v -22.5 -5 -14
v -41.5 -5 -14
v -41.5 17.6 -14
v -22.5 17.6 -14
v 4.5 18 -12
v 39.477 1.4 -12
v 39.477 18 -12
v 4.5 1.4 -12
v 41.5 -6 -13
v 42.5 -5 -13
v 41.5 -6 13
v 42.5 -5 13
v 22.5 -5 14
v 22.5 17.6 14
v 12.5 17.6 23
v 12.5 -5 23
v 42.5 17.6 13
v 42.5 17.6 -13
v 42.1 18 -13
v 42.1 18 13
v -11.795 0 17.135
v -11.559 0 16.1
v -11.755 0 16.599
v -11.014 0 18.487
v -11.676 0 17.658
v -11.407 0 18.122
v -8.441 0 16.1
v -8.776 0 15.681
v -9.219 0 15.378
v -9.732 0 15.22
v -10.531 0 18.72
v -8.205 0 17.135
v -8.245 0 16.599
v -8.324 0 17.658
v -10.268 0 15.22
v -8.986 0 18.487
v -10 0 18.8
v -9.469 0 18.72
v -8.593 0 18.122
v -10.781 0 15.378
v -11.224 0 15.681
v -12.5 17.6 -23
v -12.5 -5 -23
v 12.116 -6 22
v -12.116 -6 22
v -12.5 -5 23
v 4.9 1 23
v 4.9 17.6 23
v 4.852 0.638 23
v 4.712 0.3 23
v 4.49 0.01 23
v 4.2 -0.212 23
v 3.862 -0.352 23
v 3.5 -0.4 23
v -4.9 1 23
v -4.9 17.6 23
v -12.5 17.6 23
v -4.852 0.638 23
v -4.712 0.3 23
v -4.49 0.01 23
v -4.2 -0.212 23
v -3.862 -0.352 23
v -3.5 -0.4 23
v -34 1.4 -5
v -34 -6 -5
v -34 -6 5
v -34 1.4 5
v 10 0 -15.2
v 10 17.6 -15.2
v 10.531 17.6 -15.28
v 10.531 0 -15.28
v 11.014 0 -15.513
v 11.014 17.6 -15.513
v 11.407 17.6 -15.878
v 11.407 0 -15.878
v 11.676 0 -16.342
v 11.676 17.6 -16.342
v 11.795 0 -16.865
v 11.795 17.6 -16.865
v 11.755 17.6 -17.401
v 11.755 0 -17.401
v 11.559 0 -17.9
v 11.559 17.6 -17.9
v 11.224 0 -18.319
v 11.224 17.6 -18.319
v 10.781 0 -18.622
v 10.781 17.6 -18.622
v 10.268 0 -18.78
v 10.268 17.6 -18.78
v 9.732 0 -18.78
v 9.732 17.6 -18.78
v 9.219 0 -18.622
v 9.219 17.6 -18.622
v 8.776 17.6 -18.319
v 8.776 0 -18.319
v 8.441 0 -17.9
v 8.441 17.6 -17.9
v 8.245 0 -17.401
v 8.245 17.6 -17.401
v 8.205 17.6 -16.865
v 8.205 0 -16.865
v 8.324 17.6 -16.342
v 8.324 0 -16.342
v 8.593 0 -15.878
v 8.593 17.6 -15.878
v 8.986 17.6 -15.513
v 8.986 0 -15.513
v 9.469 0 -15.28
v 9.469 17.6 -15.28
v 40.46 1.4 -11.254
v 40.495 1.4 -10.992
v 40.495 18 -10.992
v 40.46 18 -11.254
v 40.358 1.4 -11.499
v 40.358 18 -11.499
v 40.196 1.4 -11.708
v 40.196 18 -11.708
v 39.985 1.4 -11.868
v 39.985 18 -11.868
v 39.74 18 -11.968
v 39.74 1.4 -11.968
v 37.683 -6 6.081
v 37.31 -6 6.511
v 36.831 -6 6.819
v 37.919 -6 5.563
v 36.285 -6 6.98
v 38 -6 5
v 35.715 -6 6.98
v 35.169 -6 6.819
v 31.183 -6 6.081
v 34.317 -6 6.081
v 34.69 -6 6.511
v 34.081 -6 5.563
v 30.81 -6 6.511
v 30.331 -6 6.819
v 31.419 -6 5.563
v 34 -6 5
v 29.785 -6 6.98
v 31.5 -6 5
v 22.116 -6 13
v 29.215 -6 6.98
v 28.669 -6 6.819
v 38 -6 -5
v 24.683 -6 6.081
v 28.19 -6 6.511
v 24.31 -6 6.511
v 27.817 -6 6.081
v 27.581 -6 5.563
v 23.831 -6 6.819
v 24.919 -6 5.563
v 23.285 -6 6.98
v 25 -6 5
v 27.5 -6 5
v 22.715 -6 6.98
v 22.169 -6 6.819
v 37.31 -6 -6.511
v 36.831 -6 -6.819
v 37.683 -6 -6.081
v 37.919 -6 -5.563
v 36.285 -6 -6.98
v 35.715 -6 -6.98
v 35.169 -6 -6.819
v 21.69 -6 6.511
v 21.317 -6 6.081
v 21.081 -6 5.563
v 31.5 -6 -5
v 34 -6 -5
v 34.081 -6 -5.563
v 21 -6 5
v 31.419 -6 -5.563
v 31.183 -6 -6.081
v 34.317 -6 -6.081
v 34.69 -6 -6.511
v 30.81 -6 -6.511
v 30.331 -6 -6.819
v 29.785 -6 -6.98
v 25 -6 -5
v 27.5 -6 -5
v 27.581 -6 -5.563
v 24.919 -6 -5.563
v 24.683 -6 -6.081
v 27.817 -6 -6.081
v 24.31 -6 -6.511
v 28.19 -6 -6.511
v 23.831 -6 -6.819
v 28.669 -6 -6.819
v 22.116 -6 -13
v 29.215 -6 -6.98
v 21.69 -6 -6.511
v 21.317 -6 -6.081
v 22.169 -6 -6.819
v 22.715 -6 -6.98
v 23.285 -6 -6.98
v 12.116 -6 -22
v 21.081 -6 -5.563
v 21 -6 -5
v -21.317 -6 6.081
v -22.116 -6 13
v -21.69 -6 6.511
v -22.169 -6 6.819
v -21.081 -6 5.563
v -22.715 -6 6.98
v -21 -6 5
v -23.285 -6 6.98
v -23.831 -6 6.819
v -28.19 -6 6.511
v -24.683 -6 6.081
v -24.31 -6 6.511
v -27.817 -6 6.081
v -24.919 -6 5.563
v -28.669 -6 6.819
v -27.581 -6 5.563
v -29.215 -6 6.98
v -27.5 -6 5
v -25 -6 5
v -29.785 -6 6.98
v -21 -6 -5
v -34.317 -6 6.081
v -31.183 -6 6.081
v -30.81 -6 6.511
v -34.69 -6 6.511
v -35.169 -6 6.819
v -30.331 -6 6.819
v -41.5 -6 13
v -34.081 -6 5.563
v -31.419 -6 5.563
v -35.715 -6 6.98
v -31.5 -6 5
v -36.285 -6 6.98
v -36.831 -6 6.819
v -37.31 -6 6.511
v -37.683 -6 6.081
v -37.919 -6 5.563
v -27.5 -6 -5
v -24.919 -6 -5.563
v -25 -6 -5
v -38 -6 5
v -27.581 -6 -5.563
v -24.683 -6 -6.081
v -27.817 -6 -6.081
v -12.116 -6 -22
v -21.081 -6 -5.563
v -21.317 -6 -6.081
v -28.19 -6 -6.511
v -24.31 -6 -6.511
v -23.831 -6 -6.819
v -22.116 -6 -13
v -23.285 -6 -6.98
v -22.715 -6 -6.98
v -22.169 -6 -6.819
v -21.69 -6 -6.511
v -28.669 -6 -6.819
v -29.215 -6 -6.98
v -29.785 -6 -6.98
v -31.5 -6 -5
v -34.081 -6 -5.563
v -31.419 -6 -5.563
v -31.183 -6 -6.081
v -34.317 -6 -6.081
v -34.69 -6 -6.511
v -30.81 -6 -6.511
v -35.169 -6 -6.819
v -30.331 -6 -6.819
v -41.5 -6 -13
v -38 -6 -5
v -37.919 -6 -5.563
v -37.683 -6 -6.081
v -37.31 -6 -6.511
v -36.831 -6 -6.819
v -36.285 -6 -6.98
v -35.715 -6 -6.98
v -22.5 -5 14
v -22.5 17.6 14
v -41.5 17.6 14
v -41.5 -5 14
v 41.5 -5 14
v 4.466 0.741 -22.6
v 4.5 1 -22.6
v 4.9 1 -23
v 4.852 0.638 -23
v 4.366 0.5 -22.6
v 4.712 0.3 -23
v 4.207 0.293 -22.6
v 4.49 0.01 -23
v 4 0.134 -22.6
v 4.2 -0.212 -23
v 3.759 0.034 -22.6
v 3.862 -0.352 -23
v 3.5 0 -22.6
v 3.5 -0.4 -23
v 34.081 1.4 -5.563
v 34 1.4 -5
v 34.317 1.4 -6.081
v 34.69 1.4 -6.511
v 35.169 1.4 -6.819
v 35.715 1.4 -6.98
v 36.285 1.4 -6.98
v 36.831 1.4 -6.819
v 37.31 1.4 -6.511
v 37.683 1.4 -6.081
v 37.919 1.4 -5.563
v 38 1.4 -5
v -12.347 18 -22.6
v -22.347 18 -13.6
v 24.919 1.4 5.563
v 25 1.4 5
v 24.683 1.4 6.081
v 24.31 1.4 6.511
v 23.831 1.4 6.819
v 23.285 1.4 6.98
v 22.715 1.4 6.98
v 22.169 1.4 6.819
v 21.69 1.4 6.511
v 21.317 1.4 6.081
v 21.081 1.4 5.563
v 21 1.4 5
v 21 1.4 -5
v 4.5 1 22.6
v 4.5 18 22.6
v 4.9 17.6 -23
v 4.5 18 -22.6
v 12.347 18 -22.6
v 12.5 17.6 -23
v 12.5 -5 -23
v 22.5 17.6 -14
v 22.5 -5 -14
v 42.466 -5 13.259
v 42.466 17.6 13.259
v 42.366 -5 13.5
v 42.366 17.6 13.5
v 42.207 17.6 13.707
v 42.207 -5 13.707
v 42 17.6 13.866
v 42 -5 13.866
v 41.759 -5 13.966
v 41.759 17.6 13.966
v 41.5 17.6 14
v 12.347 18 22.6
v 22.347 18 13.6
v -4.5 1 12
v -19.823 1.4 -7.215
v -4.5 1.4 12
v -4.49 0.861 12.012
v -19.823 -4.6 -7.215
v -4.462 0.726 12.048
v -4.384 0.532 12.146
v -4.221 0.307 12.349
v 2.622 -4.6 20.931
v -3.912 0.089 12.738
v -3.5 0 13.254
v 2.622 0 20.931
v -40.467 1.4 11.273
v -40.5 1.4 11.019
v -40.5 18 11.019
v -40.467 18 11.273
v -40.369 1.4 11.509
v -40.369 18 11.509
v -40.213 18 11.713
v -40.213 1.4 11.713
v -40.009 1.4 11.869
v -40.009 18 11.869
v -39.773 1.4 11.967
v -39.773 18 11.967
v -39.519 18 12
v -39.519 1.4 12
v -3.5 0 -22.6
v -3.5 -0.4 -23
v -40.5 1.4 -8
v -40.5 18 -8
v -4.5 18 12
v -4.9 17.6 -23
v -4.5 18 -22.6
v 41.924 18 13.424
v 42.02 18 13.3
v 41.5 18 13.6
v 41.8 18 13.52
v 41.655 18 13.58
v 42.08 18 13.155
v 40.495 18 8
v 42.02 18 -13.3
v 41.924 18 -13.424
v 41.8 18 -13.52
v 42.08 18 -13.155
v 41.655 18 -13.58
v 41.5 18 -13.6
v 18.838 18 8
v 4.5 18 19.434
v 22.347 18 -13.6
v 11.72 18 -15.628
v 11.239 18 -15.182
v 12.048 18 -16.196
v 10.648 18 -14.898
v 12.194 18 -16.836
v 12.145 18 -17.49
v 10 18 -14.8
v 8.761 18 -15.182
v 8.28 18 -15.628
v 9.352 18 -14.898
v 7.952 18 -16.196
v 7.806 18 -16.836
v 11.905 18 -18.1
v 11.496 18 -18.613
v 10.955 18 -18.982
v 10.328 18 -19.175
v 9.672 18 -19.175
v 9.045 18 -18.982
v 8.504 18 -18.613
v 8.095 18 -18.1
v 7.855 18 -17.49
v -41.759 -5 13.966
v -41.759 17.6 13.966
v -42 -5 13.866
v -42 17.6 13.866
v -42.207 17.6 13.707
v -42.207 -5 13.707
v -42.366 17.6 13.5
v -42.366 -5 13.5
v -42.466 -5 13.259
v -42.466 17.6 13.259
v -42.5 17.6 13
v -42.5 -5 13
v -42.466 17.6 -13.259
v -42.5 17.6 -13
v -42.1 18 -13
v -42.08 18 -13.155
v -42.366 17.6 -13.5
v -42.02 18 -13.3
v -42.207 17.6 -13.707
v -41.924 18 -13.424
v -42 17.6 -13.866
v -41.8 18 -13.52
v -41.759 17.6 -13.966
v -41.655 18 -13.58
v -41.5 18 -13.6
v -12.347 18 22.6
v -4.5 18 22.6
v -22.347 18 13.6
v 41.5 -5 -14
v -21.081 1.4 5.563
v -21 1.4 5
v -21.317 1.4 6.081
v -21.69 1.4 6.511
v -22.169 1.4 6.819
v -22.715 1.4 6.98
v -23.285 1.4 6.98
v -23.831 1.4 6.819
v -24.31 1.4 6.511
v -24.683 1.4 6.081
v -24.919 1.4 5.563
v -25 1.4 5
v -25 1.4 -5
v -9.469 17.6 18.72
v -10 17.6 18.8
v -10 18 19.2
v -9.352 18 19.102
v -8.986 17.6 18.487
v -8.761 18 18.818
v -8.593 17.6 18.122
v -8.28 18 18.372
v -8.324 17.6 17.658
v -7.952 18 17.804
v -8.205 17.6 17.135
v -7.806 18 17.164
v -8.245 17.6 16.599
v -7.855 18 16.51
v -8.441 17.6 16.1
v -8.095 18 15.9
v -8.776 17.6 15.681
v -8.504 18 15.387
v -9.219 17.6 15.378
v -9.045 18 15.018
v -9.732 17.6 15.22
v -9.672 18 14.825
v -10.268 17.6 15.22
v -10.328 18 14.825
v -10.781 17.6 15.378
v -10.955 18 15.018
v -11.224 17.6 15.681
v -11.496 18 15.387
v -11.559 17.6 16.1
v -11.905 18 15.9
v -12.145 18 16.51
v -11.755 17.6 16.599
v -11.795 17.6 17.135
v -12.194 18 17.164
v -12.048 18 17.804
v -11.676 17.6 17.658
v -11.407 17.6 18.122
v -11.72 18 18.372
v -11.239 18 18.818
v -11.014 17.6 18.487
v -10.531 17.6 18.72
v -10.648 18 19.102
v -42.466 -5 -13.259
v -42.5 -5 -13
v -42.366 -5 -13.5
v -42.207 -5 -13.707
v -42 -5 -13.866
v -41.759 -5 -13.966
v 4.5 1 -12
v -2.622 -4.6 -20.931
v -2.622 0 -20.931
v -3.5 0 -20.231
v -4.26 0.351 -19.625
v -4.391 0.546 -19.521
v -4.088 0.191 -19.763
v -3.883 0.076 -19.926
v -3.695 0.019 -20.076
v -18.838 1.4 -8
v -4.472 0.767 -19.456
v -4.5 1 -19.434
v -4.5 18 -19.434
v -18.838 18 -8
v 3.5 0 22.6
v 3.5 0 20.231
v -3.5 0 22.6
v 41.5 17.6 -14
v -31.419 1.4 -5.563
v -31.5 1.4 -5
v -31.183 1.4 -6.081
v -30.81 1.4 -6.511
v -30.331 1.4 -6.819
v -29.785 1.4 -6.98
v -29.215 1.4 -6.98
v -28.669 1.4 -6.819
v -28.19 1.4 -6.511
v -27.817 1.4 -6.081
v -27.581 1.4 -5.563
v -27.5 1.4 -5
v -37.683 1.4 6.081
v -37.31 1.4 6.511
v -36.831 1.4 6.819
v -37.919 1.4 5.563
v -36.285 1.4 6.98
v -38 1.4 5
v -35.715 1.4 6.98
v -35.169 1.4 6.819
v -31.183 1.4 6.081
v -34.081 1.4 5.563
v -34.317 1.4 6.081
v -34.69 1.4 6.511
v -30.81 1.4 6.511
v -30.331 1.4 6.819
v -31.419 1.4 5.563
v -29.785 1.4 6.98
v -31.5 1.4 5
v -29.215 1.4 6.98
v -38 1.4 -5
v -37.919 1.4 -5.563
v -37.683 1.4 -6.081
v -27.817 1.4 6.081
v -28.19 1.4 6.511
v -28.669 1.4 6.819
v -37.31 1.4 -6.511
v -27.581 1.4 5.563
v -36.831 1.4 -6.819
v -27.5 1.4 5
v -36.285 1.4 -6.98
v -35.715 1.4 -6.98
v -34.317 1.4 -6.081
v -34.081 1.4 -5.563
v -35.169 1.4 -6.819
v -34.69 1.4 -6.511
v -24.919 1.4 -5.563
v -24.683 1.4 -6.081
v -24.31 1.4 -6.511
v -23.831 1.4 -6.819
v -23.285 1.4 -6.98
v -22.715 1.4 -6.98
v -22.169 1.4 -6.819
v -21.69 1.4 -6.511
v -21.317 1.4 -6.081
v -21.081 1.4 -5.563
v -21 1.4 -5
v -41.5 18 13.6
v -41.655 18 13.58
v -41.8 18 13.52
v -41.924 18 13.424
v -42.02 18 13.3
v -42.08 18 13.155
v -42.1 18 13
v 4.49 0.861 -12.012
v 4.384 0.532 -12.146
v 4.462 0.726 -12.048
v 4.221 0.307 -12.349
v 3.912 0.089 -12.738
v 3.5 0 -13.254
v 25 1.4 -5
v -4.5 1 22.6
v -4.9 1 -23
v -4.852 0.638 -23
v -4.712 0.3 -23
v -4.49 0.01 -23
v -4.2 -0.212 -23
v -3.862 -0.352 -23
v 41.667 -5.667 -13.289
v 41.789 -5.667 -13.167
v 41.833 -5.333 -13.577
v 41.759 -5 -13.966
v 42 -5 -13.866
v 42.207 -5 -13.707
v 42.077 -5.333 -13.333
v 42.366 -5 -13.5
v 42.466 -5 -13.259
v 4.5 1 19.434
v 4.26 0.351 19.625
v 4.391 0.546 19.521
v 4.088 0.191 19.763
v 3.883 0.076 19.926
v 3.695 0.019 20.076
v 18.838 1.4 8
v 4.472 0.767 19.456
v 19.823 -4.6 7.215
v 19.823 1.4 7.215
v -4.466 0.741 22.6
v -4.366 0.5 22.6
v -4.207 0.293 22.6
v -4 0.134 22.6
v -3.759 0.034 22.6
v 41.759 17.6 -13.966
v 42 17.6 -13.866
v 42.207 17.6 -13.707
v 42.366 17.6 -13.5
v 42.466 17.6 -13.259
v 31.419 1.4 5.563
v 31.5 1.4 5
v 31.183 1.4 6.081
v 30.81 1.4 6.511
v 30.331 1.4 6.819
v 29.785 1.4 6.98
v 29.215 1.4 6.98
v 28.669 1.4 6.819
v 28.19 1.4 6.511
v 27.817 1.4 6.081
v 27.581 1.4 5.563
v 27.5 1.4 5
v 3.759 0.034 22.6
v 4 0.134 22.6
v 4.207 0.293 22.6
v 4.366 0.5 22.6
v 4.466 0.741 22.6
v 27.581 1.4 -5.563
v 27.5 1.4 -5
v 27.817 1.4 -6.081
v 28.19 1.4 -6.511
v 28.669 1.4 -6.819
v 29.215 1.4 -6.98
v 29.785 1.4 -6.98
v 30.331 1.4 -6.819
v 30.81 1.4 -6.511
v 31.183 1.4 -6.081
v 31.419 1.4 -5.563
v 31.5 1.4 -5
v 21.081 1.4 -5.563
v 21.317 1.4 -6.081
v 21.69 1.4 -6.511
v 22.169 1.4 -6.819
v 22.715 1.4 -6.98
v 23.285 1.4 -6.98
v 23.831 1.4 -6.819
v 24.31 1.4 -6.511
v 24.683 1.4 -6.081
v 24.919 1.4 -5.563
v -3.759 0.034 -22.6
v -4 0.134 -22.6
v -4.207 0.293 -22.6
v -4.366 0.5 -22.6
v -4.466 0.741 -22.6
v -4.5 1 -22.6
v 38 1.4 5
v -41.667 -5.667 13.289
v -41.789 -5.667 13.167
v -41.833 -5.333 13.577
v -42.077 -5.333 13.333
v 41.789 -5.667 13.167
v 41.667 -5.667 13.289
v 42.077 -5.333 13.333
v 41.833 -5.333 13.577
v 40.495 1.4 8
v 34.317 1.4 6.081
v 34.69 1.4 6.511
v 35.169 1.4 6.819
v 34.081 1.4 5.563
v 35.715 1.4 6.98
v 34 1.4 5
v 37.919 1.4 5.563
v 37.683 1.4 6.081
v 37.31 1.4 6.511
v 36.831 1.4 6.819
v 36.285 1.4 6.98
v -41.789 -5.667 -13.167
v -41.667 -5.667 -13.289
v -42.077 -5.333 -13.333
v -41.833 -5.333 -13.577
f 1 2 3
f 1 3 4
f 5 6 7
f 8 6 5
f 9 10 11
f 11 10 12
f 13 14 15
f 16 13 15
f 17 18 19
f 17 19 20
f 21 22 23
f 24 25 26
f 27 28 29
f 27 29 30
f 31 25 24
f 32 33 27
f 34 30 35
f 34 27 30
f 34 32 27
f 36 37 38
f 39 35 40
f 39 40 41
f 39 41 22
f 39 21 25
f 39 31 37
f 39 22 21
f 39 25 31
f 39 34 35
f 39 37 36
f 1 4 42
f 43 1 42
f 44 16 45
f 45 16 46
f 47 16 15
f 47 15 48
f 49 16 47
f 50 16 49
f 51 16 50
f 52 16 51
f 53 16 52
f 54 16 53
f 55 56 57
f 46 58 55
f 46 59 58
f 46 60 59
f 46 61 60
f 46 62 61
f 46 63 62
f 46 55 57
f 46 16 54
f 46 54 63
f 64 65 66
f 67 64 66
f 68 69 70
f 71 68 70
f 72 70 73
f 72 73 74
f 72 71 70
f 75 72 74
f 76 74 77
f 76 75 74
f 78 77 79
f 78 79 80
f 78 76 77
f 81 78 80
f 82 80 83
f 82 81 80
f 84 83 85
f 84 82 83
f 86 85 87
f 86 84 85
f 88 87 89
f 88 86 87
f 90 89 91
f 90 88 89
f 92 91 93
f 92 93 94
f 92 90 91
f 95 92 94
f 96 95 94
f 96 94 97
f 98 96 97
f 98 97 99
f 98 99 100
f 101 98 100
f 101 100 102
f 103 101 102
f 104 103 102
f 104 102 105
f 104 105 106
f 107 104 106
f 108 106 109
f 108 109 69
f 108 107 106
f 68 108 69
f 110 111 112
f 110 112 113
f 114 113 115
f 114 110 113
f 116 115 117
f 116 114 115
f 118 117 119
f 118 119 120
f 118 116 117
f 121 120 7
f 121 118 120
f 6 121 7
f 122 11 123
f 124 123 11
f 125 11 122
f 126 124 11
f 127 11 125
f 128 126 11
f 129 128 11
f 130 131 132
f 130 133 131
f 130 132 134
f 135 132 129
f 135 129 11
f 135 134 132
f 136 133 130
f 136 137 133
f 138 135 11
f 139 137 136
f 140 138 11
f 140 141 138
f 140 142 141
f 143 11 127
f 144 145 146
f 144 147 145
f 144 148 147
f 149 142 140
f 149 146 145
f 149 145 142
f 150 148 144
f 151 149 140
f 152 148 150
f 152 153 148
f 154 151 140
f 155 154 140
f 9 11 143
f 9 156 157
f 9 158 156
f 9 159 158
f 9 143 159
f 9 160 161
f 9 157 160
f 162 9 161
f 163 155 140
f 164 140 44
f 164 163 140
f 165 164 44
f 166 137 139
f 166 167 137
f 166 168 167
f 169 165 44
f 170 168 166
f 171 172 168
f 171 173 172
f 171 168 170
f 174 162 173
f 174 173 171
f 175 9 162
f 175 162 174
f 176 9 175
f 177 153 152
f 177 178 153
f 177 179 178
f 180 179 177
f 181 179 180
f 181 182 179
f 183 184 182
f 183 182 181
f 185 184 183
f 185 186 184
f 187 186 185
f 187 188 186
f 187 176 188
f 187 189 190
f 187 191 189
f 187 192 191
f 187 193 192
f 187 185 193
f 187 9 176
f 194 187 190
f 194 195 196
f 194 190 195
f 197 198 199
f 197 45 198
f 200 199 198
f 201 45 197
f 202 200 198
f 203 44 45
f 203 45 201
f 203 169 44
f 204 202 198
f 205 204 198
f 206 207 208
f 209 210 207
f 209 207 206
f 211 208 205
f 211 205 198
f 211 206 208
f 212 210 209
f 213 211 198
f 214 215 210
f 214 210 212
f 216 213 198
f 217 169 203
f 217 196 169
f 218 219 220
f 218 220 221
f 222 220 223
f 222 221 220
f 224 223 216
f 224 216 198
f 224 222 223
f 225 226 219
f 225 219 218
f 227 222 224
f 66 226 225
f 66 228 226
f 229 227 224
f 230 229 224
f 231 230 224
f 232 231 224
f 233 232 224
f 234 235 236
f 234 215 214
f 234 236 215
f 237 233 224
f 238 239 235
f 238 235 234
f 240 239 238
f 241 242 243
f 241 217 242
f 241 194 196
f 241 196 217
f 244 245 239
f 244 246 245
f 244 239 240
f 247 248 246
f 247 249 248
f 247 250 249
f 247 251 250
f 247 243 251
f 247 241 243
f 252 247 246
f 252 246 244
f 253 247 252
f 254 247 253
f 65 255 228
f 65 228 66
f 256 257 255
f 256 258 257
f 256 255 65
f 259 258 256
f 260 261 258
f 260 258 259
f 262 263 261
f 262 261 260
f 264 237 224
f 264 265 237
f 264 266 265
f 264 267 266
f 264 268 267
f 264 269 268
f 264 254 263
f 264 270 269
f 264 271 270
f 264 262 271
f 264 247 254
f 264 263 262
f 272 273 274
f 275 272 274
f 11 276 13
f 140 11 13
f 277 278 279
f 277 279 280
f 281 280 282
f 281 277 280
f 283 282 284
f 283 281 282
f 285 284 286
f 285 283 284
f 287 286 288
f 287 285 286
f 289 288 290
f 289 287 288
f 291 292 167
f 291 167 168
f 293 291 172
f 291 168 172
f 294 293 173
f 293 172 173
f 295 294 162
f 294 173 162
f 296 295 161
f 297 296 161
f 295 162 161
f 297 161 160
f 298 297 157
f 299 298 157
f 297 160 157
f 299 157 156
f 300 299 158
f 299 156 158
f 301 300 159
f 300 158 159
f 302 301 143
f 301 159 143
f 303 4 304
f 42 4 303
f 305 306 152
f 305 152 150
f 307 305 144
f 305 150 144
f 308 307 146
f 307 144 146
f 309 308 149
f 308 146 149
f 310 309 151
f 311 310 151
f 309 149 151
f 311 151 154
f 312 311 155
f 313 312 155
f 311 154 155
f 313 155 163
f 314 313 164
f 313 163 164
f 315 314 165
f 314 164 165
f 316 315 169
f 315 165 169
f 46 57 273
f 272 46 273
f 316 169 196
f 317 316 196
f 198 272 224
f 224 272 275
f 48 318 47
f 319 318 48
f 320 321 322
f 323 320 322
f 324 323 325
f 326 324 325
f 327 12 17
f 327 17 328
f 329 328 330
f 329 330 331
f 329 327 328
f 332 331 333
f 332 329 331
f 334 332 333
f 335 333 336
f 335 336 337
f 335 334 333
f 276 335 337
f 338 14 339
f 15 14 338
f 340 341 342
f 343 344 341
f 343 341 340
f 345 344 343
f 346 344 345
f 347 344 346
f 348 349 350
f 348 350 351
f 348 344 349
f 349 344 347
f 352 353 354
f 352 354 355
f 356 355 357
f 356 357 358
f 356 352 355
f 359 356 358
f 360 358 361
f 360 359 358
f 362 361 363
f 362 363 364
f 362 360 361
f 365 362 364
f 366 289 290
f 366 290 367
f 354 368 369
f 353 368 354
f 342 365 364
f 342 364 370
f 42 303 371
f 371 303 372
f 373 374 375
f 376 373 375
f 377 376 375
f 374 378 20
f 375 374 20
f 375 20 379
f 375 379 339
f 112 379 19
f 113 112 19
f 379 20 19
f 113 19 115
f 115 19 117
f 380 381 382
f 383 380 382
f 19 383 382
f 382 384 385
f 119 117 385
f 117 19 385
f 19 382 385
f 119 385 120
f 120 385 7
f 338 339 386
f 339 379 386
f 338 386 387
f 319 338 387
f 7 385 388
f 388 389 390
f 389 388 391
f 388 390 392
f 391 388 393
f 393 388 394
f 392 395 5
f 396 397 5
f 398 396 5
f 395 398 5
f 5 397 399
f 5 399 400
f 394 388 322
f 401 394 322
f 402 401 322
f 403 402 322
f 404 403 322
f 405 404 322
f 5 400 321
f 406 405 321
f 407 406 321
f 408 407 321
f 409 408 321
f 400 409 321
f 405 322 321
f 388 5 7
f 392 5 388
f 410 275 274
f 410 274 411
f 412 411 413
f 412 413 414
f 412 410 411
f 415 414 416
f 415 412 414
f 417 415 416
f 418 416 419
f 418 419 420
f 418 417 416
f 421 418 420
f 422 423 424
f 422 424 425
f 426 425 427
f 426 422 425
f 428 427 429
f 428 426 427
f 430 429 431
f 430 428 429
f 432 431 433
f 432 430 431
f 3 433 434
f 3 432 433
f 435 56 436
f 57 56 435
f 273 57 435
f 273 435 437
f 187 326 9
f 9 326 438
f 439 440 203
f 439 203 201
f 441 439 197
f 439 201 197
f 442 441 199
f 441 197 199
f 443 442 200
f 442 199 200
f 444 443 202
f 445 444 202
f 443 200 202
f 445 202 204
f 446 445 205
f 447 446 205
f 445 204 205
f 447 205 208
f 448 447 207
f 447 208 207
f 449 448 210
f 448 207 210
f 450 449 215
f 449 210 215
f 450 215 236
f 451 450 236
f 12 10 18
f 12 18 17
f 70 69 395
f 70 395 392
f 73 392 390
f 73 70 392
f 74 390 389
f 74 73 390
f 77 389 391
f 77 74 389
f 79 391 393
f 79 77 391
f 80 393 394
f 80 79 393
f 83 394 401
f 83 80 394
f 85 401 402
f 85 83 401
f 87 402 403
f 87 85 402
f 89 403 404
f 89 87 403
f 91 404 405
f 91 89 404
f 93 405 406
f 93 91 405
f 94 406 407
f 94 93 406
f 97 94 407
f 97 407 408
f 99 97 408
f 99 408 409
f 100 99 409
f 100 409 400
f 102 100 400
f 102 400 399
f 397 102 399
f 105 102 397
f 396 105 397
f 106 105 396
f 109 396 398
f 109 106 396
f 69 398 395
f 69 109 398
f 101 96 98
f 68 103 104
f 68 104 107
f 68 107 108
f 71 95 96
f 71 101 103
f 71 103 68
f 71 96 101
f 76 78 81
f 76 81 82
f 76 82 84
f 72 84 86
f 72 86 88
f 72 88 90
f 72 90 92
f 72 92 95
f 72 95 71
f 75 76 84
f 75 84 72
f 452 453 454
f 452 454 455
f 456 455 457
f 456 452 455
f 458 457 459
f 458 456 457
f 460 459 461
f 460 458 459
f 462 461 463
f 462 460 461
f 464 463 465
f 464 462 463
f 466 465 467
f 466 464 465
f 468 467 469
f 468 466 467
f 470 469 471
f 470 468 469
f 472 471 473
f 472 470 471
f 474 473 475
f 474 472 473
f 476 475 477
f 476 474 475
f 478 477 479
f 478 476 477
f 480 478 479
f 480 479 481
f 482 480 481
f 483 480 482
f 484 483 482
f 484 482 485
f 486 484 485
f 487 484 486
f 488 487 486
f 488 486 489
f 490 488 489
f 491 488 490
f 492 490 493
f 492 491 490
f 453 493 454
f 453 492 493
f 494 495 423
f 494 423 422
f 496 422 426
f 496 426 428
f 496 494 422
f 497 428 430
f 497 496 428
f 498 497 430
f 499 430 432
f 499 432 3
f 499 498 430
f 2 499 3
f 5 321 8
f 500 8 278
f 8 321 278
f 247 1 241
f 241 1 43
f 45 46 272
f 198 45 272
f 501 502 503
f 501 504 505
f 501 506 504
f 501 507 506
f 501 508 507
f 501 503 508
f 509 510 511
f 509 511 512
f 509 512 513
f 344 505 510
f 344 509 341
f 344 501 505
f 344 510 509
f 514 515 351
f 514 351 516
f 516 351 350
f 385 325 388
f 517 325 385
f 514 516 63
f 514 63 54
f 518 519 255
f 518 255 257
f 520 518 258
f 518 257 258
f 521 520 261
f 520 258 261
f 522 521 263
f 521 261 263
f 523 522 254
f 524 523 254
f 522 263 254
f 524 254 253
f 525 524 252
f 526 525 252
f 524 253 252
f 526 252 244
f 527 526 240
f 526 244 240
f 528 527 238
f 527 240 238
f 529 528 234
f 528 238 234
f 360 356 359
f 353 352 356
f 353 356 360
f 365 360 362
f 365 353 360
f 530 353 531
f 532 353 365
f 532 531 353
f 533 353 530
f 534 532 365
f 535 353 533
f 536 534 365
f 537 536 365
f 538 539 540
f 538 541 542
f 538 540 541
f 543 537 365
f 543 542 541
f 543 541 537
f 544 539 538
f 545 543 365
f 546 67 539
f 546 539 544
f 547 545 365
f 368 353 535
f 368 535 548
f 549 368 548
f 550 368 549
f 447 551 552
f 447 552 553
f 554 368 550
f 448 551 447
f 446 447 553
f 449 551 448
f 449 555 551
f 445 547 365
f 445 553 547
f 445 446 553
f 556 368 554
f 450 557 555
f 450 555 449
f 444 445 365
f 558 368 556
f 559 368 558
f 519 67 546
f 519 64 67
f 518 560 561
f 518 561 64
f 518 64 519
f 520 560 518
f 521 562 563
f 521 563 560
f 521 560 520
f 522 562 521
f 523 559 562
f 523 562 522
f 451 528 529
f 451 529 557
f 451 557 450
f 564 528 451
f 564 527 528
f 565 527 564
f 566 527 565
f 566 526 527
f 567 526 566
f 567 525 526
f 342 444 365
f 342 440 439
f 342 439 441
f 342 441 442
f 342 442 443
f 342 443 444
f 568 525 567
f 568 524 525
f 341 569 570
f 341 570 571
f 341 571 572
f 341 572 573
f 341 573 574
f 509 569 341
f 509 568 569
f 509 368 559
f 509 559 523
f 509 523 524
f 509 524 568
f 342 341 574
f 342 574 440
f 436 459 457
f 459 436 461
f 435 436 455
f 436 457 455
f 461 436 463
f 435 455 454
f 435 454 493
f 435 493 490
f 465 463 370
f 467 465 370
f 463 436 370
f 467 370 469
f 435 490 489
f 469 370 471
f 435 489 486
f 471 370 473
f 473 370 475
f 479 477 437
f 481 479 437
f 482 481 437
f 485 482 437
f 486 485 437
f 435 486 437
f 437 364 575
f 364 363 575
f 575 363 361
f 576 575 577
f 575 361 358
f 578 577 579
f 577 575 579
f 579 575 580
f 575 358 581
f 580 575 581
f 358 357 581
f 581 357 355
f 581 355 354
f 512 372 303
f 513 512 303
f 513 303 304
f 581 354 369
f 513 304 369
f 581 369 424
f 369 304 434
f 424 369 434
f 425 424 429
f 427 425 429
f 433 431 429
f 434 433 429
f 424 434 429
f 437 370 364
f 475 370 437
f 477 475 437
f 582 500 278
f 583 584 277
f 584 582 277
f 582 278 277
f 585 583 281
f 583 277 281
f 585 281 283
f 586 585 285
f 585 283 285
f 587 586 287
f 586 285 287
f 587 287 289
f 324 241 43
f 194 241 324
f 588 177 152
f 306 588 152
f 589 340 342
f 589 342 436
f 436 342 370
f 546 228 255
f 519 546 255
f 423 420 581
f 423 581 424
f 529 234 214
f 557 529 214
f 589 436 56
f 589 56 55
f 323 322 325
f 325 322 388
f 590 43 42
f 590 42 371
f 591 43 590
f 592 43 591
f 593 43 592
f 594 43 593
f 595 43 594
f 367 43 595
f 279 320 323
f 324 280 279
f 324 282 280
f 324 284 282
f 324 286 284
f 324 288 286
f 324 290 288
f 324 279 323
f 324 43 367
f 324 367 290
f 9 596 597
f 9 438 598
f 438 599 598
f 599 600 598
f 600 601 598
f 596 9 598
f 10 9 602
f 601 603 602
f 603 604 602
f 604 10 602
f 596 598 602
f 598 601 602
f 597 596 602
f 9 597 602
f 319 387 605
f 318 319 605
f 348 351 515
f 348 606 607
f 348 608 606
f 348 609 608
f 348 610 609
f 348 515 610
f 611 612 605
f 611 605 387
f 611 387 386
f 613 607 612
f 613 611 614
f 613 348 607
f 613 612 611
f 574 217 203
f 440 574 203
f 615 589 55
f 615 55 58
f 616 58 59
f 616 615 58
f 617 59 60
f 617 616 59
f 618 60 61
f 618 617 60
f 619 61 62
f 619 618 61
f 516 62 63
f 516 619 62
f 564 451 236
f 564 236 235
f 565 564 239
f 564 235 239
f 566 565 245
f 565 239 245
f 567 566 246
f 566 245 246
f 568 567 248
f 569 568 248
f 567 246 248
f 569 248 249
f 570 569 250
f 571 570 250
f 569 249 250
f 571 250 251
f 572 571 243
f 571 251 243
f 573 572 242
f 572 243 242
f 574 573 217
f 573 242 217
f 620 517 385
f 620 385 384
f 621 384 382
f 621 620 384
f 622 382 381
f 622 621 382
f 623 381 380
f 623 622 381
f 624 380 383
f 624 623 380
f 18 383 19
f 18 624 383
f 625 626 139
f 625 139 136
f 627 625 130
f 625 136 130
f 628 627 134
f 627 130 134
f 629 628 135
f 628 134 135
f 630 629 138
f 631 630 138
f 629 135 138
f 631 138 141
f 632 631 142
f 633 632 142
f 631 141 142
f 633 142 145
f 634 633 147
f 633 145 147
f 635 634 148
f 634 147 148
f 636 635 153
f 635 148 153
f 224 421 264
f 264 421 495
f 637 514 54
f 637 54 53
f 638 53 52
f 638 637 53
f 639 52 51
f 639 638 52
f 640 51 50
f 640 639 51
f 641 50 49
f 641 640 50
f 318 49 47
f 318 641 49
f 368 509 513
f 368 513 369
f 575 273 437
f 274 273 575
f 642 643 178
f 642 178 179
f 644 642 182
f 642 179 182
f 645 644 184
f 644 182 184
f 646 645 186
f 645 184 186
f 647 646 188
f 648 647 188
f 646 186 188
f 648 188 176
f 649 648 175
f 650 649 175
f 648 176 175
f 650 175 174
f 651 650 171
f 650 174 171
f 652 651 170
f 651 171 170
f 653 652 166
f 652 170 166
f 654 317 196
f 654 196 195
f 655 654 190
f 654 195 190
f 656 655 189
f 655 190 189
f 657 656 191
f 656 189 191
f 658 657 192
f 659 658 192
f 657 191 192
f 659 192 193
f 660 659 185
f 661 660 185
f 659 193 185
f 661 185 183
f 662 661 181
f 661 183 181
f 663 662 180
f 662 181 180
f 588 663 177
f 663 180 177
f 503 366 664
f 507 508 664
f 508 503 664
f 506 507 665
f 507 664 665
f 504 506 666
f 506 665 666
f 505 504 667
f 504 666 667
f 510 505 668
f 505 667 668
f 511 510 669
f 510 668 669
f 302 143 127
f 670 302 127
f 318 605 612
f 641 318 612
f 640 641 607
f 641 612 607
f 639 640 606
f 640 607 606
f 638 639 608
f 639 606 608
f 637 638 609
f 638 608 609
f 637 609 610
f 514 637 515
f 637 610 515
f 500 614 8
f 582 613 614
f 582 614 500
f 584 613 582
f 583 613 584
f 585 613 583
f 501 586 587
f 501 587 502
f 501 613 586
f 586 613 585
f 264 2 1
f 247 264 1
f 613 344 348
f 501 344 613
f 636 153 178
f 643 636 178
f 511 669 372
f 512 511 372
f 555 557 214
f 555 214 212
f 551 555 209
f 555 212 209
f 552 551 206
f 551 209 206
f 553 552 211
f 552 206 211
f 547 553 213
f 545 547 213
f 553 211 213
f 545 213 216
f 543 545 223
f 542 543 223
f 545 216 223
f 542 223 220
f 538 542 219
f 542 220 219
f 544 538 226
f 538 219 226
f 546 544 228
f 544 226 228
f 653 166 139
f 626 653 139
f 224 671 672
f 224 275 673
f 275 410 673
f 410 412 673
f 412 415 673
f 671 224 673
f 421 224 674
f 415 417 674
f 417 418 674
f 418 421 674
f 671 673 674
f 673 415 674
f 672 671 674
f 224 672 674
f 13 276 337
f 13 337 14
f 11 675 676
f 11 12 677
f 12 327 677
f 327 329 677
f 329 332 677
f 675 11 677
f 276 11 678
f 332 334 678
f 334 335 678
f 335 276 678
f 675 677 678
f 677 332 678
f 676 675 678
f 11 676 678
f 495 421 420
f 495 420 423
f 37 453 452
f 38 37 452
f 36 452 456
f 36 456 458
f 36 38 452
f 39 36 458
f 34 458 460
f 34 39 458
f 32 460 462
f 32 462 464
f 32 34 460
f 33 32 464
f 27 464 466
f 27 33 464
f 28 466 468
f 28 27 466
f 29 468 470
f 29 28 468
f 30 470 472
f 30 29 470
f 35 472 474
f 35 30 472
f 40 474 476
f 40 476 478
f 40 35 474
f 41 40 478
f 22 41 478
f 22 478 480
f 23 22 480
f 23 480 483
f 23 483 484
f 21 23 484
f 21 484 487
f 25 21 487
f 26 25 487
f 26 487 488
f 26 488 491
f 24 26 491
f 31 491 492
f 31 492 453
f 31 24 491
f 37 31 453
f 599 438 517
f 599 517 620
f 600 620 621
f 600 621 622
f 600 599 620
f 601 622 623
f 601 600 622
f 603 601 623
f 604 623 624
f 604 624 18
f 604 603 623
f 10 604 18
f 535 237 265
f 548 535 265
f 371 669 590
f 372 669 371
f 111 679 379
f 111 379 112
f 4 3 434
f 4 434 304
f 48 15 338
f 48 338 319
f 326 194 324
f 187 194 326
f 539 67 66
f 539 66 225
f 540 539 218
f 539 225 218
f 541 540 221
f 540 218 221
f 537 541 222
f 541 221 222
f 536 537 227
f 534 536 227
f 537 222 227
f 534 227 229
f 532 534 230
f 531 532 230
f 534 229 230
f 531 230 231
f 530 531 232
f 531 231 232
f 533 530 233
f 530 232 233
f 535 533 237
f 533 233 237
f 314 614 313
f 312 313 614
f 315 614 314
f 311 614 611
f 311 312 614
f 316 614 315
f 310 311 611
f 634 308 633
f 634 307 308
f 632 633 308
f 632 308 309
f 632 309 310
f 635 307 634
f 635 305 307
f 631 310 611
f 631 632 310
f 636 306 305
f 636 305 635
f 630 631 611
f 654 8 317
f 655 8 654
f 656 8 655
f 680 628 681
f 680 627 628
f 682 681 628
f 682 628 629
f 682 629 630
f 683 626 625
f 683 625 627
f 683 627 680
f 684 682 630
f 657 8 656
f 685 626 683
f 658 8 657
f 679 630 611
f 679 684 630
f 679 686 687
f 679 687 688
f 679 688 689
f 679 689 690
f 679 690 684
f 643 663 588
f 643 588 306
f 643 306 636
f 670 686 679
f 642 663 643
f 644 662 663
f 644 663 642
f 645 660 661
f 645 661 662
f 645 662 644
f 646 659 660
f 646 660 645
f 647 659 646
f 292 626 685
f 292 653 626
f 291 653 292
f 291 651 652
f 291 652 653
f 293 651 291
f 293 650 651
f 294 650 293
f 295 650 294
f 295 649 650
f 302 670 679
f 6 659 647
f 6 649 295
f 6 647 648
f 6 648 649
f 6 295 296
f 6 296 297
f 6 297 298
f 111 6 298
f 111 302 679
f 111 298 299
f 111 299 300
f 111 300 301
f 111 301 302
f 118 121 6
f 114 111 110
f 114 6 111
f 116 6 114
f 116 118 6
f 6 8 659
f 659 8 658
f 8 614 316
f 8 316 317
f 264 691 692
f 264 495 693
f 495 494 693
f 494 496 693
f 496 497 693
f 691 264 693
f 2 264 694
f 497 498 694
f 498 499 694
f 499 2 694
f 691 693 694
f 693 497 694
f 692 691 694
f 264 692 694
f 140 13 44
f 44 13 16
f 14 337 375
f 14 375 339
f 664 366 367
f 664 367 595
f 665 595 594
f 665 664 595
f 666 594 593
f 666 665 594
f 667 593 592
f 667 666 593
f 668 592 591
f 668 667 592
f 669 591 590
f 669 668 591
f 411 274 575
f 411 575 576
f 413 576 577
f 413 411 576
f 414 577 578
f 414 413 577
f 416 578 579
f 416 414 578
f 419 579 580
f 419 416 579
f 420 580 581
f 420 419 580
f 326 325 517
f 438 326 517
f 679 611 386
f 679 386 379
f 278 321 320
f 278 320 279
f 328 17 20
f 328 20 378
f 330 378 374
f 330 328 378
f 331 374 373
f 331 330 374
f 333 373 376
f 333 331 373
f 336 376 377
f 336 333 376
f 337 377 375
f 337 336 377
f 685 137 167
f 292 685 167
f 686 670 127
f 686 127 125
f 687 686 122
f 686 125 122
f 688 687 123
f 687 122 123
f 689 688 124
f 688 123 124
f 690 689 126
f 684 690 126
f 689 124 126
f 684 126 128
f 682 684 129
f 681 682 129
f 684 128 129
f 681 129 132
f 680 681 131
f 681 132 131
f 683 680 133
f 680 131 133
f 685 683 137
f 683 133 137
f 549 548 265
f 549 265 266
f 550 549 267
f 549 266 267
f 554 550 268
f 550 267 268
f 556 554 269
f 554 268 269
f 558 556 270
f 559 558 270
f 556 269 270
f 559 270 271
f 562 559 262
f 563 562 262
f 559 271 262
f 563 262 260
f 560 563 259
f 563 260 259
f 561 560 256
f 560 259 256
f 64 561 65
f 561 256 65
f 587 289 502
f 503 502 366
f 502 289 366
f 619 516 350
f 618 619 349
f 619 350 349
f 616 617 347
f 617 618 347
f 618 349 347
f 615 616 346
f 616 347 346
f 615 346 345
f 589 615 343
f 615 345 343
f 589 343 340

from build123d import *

# Parameters (mm, degrees)
BOSS_EXTRUDE2_DEPTH           = 18
BOSS_EXTRUDE2_DEPTH_BACK      = 6
BOSS_EXTRUDE3_DEPTH           = 18
BOSS_EXTRUDE3_DEPTH_BACK      = 6
LOAD_BAR_ARM_SLOTS_DEPTH      = 30
LOAD_BAR_ARM_SLOTS_DEPTH_BACK = 30
F_10KG_START                  = 1.4
F_10KG_TAL_BAR_SLOT_DEPTH     = 16.6
HX711_CHIP_HOLSTER_DEPTH      = 18
HX711_CHIP_HOLSTER_DEPTH_BACK = 4.6
SKETCH6_R                     = 1.8
SCREW_HOLE_DEPTH              = 18
CHAMFER3_SIZE                 = 0.4
CHAMFER8_SIZE                 = 1
CUT_EXTRUDE6_DEPTH            = 7
CUT_EXTRUDE6_DEPTH_BACK       = 7


with BuildPart() as part:
    # Sketch1 → Boss-Extrude2 (new, two sides: drawn at the far end of the back side and taken through both)
    with BuildSketch(Plane(origin=(0, 0, 0), x_dir=(1, 0, 0), z_dir=(0, 1, 0)).offset(-BOSS_EXTRUDE2_DEPTH_BACK)):
        with BuildLine():
            Line((-41.5, 14), (41.5, 14))
            ThreePointArc((41.5, 14), (42.207106781, 13.707106781), (42.5, 13))
            Line((42.5, 13), (42.5, -13))
            ThreePointArc((42.5, -13), (42.207106781, -13.707106781), (41.5, -14))
            Line((41.5, -14), (-41.5, -14))
            ThreePointArc((-41.5, -14), (-42.207106781, -13.707106781), (-42.5, -13))
            Line((-42.5, -13), (-42.5, 13))
            ThreePointArc((-42.5, 13), (-42.207106781, 13.707106781), (-41.5, 14))
        make_face()
    extrude(amount=BOSS_EXTRUDE2_DEPTH + BOSS_EXTRUDE2_DEPTH_BACK)

    # Sketch4 → Boss-Extrude3 (add, two sides: drawn at the far end of the back side and taken through both)
    with BuildSketch(Plane(origin=(0, 0, 0), x_dir=(1, 0, 0), z_dir=(0, 1, 0)).offset(-BOSS_EXTRUDE3_DEPTH_BACK)):
        Polygon((-12.5, 23), (12.5, 23), (22.5, 14), (22.5, -14), (12.5, -23), (-12.5, -23), (-22.5, -14), (-22.5, 14), align=None)
    extrude(amount=BOSS_EXTRUDE3_DEPTH + BOSS_EXTRUDE3_DEPTH_BACK)

    # Sketch2 → load bar arm slots (cut, two sides: drawn at the far end of the back side and taken through both)
    with BuildSketch(Plane.XY.offset(-LOAD_BAR_ARM_SLOTS_DEPTH_BACK)):
        with BuildLine():
            Line((-3.5, 19), (3.5, 19))
            ThreePointArc((3.5, 19), (4.207106781, 18.707106781), (4.5, 18))
            Line((4.5, 18), (4.5, 1))
            ThreePointArc((4.5, 1), (4.207106781, 0.292893219), (3.5, 0))
            Line((3.5, 0), (-3.5, 0))
            ThreePointArc((-3.5, 0), (-4.207106781, 0.292893219), (-4.5, 1))
            Line((-4.5, 1), (-4.5, 18))
            ThreePointArc((-4.5, 18), (-4.207106781, 18.707106781), (-3.5, 19))
        make_face()
    extrude(amount=LOAD_BAR_ARM_SLOTS_DEPTH + LOAD_BAR_ARM_SLOTS_DEPTH_BACK, mode=Mode.SUBTRACT)

    # Sketch5 → 10kg TAL bar slot (cut)
    with BuildSketch(Plane(origin=(0, 0, 0), x_dir=(1, 0, 0), z_dir=(0, 1, 0)).offset(F_10KG_START)):
        with BuildLine():
            Line((-40.5, 8), (-40.5, -11.01888353))
            ThreePointArc((-40.5, -11.01888353), (-40.212637639, -11.712637639), (-39.51888353, -12))
            Line((-39.51888353, -12), (13.495093721, -12))
            Line((13.495093721, -12), (13.495093721, -8))
            Line((13.495093721, -8), (40.495093721, -8))
            Line((40.495093721, -8), (40.495093721, 10.991511742))
            ThreePointArc((40.495093721, 10.991511742), (40.196297826, 11.708039924), (39.4769572, 12))
            Line((39.4769572, 12), (-13.5, 12))
            Line((-13.5, 12), (-13.5, 8))
            Line((-13.5, 8), (-40.5, 8))
        make_face()
    extrude(amount=F_10KG_TAL_BAR_SLOT_DEPTH, mode=Mode.SUBTRACT)

    # Sketch3 → hx711 chip holster (cut, two sides: drawn at the far end of the back side and taken through both)
    with BuildSketch(Plane(origin=(0, 0, 0), x_dir=(1, 0, 0), z_dir=(0, 1, 0)).offset(-HX711_CHIP_HOLSTER_DEPTH_BACK)):
        Polygon((-2.622290437, 20.931402076), (-19.822831867, 7.214938445), (2.622290437, -20.931402076), (19.822831867, -7.214938445), align=None)
    extrude(amount=HX711_CHIP_HOLSTER_DEPTH + HX711_CHIP_HOLSTER_DEPTH_BACK, mode=Mode.SUBTRACT)

    # Sketch6 → screw hole (cut)
    with BuildSketch(Plane(origin=(0, 0, 0), x_dir=(1, 0, 0), z_dir=(0, 1, 0))):
        with Locations(Location((-10, -17, 0), (0, 0, 270))):
            Circle(SKETCH6_R)
        with Locations(Location((10, 17, 0), (0, 0, 270))):
            Circle(SKETCH6_R)
    extrude(amount=SCREW_HOLE_DEPTH, mode=Mode.SUBTRACT)

    # Chamfer3
    chamfer3_edges = [part.edges().sort_by_distance(p)[0] for p in [
        (-10, 18, 15.2),
        (10, 18, -18.8),
        (42.207106781, 18, -13.707106781),
        (32, 18, -14),
        (-42.207106781, 18, -13.707106781),
        (-42.5, 18, 0),
        (-42.207106781, 18, 13.707106781),
        (-32, 18, 14),
        (42.207106781, 18, 13.707106781),
        (42.5, 18, 0),
        (-32, 18, -14),
        (32, 18, 14),
        (-17.5, 18, 18.5),
        (-8.5, 18, 23),
        (17.5, 18, 18.5),
        (17.5, 18, -18.5),
        (8.5, 18, -23),
        (-17.5, 18, -18.5),
        (8.5, 18, 23),
        (4.5, 9.5, 23),
        (4.207106781, 0.292893219, 23),
        (0, 0, 23),
        (-4.207106781, 0.292893219, 23),
        (-4.5, 9.5, 23),
        (-8.5, 18, -23),
        (4.5, 9.5, -23),
        (-4.5, 9.5, -23),
        (-4.207106781, 0.292893219, -23),
        (0, 0, -23),
        (4.207106781, 0.292893219, -23),
    ]]
    chamfer(chamfer3_edges, length=CHAMFER3_SIZE)

    # Chamfer8
    chamfer8_edges = [part.edges().sort_by_distance(p)[0] for p in [
        (-42.207106781, -6, -13.707106781),
        (-42.5, -6, 0),
        (-42.207106781, -6, 13.707106781),
        (-32, -6, 14),
        (42.207106781, -6, 13.707106781),
        (42.5, -6, 0),
        (32, -6, 14),
        (-32, -6, -14),
        (-17.5, -6, -18.5),
        (0, -6, -23),
        (17.5, -6, -18.5),
        (42.207106781, -6, -13.707106781),
        (17.5, -6, 18.5),
        (0, -6, 23),
        (-17.5, -6, 18.5),
        (32, -6, -14),
    ]]
    chamfer(chamfer8_edges, length=CHAMFER8_SIZE - 0.0001)  # a hair under: the kernel refuses the full size

    # Sketch10 → Cut-Extrude6 (cut, two sides: drawn at the far end of the back side and taken through both)
    with BuildSketch(Plane(origin=(0, 0, 0), x_dir=(1, 0, 0), z_dir=(0, 1, 0)).offset(-CUT_EXTRUDE6_DEPTH_BACK)):
        with BuildLine():
            Line((-38, -5), (-38, 5))
            ThreePointArc((-38, 5), (-36, 7), (-34, 5))
            Line((-34, 5), (-34, -5))
            ThreePointArc((-34, -5), (-36, -7), (-38, -5))
        make_face()
        with BuildLine():
            Line((-31.5, -5), (-31.5, 5))
            ThreePointArc((-31.5, 5), (-29.5, 7), (-27.5, 5))
            Line((-27.5, 5), (-27.5, -5))
            ThreePointArc((-27.5, -5), (-29.5, -7), (-31.5, -5))
        make_face()
        with BuildLine():
            Line((-25, -5), (-25, 5))
            ThreePointArc((-25, 5), (-23, 7), (-21, 5))
            Line((-21, 5), (-21, -5))
            ThreePointArc((-21, -5), (-23, -7), (-25, -5))
        make_face()
        with BuildLine():
            Line((21, -5), (21, 5))
            ThreePointArc((21, 5), (23, 7), (25, 5))
            Line((25, 5), (25, -5))
            ThreePointArc((25, -5), (23, -7), (21, -5))
        make_face()
        with BuildLine():
            Line((27.5, -5), (27.5, 5))
            ThreePointArc((27.5, 5), (29.5, 7), (31.5, 5))
            Line((31.5, 5), (31.5, -5))
            ThreePointArc((31.5, -5), (29.5, -7), (27.5, -5))
        make_face()
        with BuildLine():
            Line((34, -5), (34, 5))
            ThreePointArc((34, 5), (36, 7), (38, 5))
            Line((38, 5), (38, -5))
            ThreePointArc((38, -5), (36, -7), (34, -5))
        make_face()
    extrude(amount=CUT_EXTRUDE6_DEPTH + CUT_EXTRUDE6_DEPTH_BACK, mode=Mode.SUBTRACT)


solid = part.part
